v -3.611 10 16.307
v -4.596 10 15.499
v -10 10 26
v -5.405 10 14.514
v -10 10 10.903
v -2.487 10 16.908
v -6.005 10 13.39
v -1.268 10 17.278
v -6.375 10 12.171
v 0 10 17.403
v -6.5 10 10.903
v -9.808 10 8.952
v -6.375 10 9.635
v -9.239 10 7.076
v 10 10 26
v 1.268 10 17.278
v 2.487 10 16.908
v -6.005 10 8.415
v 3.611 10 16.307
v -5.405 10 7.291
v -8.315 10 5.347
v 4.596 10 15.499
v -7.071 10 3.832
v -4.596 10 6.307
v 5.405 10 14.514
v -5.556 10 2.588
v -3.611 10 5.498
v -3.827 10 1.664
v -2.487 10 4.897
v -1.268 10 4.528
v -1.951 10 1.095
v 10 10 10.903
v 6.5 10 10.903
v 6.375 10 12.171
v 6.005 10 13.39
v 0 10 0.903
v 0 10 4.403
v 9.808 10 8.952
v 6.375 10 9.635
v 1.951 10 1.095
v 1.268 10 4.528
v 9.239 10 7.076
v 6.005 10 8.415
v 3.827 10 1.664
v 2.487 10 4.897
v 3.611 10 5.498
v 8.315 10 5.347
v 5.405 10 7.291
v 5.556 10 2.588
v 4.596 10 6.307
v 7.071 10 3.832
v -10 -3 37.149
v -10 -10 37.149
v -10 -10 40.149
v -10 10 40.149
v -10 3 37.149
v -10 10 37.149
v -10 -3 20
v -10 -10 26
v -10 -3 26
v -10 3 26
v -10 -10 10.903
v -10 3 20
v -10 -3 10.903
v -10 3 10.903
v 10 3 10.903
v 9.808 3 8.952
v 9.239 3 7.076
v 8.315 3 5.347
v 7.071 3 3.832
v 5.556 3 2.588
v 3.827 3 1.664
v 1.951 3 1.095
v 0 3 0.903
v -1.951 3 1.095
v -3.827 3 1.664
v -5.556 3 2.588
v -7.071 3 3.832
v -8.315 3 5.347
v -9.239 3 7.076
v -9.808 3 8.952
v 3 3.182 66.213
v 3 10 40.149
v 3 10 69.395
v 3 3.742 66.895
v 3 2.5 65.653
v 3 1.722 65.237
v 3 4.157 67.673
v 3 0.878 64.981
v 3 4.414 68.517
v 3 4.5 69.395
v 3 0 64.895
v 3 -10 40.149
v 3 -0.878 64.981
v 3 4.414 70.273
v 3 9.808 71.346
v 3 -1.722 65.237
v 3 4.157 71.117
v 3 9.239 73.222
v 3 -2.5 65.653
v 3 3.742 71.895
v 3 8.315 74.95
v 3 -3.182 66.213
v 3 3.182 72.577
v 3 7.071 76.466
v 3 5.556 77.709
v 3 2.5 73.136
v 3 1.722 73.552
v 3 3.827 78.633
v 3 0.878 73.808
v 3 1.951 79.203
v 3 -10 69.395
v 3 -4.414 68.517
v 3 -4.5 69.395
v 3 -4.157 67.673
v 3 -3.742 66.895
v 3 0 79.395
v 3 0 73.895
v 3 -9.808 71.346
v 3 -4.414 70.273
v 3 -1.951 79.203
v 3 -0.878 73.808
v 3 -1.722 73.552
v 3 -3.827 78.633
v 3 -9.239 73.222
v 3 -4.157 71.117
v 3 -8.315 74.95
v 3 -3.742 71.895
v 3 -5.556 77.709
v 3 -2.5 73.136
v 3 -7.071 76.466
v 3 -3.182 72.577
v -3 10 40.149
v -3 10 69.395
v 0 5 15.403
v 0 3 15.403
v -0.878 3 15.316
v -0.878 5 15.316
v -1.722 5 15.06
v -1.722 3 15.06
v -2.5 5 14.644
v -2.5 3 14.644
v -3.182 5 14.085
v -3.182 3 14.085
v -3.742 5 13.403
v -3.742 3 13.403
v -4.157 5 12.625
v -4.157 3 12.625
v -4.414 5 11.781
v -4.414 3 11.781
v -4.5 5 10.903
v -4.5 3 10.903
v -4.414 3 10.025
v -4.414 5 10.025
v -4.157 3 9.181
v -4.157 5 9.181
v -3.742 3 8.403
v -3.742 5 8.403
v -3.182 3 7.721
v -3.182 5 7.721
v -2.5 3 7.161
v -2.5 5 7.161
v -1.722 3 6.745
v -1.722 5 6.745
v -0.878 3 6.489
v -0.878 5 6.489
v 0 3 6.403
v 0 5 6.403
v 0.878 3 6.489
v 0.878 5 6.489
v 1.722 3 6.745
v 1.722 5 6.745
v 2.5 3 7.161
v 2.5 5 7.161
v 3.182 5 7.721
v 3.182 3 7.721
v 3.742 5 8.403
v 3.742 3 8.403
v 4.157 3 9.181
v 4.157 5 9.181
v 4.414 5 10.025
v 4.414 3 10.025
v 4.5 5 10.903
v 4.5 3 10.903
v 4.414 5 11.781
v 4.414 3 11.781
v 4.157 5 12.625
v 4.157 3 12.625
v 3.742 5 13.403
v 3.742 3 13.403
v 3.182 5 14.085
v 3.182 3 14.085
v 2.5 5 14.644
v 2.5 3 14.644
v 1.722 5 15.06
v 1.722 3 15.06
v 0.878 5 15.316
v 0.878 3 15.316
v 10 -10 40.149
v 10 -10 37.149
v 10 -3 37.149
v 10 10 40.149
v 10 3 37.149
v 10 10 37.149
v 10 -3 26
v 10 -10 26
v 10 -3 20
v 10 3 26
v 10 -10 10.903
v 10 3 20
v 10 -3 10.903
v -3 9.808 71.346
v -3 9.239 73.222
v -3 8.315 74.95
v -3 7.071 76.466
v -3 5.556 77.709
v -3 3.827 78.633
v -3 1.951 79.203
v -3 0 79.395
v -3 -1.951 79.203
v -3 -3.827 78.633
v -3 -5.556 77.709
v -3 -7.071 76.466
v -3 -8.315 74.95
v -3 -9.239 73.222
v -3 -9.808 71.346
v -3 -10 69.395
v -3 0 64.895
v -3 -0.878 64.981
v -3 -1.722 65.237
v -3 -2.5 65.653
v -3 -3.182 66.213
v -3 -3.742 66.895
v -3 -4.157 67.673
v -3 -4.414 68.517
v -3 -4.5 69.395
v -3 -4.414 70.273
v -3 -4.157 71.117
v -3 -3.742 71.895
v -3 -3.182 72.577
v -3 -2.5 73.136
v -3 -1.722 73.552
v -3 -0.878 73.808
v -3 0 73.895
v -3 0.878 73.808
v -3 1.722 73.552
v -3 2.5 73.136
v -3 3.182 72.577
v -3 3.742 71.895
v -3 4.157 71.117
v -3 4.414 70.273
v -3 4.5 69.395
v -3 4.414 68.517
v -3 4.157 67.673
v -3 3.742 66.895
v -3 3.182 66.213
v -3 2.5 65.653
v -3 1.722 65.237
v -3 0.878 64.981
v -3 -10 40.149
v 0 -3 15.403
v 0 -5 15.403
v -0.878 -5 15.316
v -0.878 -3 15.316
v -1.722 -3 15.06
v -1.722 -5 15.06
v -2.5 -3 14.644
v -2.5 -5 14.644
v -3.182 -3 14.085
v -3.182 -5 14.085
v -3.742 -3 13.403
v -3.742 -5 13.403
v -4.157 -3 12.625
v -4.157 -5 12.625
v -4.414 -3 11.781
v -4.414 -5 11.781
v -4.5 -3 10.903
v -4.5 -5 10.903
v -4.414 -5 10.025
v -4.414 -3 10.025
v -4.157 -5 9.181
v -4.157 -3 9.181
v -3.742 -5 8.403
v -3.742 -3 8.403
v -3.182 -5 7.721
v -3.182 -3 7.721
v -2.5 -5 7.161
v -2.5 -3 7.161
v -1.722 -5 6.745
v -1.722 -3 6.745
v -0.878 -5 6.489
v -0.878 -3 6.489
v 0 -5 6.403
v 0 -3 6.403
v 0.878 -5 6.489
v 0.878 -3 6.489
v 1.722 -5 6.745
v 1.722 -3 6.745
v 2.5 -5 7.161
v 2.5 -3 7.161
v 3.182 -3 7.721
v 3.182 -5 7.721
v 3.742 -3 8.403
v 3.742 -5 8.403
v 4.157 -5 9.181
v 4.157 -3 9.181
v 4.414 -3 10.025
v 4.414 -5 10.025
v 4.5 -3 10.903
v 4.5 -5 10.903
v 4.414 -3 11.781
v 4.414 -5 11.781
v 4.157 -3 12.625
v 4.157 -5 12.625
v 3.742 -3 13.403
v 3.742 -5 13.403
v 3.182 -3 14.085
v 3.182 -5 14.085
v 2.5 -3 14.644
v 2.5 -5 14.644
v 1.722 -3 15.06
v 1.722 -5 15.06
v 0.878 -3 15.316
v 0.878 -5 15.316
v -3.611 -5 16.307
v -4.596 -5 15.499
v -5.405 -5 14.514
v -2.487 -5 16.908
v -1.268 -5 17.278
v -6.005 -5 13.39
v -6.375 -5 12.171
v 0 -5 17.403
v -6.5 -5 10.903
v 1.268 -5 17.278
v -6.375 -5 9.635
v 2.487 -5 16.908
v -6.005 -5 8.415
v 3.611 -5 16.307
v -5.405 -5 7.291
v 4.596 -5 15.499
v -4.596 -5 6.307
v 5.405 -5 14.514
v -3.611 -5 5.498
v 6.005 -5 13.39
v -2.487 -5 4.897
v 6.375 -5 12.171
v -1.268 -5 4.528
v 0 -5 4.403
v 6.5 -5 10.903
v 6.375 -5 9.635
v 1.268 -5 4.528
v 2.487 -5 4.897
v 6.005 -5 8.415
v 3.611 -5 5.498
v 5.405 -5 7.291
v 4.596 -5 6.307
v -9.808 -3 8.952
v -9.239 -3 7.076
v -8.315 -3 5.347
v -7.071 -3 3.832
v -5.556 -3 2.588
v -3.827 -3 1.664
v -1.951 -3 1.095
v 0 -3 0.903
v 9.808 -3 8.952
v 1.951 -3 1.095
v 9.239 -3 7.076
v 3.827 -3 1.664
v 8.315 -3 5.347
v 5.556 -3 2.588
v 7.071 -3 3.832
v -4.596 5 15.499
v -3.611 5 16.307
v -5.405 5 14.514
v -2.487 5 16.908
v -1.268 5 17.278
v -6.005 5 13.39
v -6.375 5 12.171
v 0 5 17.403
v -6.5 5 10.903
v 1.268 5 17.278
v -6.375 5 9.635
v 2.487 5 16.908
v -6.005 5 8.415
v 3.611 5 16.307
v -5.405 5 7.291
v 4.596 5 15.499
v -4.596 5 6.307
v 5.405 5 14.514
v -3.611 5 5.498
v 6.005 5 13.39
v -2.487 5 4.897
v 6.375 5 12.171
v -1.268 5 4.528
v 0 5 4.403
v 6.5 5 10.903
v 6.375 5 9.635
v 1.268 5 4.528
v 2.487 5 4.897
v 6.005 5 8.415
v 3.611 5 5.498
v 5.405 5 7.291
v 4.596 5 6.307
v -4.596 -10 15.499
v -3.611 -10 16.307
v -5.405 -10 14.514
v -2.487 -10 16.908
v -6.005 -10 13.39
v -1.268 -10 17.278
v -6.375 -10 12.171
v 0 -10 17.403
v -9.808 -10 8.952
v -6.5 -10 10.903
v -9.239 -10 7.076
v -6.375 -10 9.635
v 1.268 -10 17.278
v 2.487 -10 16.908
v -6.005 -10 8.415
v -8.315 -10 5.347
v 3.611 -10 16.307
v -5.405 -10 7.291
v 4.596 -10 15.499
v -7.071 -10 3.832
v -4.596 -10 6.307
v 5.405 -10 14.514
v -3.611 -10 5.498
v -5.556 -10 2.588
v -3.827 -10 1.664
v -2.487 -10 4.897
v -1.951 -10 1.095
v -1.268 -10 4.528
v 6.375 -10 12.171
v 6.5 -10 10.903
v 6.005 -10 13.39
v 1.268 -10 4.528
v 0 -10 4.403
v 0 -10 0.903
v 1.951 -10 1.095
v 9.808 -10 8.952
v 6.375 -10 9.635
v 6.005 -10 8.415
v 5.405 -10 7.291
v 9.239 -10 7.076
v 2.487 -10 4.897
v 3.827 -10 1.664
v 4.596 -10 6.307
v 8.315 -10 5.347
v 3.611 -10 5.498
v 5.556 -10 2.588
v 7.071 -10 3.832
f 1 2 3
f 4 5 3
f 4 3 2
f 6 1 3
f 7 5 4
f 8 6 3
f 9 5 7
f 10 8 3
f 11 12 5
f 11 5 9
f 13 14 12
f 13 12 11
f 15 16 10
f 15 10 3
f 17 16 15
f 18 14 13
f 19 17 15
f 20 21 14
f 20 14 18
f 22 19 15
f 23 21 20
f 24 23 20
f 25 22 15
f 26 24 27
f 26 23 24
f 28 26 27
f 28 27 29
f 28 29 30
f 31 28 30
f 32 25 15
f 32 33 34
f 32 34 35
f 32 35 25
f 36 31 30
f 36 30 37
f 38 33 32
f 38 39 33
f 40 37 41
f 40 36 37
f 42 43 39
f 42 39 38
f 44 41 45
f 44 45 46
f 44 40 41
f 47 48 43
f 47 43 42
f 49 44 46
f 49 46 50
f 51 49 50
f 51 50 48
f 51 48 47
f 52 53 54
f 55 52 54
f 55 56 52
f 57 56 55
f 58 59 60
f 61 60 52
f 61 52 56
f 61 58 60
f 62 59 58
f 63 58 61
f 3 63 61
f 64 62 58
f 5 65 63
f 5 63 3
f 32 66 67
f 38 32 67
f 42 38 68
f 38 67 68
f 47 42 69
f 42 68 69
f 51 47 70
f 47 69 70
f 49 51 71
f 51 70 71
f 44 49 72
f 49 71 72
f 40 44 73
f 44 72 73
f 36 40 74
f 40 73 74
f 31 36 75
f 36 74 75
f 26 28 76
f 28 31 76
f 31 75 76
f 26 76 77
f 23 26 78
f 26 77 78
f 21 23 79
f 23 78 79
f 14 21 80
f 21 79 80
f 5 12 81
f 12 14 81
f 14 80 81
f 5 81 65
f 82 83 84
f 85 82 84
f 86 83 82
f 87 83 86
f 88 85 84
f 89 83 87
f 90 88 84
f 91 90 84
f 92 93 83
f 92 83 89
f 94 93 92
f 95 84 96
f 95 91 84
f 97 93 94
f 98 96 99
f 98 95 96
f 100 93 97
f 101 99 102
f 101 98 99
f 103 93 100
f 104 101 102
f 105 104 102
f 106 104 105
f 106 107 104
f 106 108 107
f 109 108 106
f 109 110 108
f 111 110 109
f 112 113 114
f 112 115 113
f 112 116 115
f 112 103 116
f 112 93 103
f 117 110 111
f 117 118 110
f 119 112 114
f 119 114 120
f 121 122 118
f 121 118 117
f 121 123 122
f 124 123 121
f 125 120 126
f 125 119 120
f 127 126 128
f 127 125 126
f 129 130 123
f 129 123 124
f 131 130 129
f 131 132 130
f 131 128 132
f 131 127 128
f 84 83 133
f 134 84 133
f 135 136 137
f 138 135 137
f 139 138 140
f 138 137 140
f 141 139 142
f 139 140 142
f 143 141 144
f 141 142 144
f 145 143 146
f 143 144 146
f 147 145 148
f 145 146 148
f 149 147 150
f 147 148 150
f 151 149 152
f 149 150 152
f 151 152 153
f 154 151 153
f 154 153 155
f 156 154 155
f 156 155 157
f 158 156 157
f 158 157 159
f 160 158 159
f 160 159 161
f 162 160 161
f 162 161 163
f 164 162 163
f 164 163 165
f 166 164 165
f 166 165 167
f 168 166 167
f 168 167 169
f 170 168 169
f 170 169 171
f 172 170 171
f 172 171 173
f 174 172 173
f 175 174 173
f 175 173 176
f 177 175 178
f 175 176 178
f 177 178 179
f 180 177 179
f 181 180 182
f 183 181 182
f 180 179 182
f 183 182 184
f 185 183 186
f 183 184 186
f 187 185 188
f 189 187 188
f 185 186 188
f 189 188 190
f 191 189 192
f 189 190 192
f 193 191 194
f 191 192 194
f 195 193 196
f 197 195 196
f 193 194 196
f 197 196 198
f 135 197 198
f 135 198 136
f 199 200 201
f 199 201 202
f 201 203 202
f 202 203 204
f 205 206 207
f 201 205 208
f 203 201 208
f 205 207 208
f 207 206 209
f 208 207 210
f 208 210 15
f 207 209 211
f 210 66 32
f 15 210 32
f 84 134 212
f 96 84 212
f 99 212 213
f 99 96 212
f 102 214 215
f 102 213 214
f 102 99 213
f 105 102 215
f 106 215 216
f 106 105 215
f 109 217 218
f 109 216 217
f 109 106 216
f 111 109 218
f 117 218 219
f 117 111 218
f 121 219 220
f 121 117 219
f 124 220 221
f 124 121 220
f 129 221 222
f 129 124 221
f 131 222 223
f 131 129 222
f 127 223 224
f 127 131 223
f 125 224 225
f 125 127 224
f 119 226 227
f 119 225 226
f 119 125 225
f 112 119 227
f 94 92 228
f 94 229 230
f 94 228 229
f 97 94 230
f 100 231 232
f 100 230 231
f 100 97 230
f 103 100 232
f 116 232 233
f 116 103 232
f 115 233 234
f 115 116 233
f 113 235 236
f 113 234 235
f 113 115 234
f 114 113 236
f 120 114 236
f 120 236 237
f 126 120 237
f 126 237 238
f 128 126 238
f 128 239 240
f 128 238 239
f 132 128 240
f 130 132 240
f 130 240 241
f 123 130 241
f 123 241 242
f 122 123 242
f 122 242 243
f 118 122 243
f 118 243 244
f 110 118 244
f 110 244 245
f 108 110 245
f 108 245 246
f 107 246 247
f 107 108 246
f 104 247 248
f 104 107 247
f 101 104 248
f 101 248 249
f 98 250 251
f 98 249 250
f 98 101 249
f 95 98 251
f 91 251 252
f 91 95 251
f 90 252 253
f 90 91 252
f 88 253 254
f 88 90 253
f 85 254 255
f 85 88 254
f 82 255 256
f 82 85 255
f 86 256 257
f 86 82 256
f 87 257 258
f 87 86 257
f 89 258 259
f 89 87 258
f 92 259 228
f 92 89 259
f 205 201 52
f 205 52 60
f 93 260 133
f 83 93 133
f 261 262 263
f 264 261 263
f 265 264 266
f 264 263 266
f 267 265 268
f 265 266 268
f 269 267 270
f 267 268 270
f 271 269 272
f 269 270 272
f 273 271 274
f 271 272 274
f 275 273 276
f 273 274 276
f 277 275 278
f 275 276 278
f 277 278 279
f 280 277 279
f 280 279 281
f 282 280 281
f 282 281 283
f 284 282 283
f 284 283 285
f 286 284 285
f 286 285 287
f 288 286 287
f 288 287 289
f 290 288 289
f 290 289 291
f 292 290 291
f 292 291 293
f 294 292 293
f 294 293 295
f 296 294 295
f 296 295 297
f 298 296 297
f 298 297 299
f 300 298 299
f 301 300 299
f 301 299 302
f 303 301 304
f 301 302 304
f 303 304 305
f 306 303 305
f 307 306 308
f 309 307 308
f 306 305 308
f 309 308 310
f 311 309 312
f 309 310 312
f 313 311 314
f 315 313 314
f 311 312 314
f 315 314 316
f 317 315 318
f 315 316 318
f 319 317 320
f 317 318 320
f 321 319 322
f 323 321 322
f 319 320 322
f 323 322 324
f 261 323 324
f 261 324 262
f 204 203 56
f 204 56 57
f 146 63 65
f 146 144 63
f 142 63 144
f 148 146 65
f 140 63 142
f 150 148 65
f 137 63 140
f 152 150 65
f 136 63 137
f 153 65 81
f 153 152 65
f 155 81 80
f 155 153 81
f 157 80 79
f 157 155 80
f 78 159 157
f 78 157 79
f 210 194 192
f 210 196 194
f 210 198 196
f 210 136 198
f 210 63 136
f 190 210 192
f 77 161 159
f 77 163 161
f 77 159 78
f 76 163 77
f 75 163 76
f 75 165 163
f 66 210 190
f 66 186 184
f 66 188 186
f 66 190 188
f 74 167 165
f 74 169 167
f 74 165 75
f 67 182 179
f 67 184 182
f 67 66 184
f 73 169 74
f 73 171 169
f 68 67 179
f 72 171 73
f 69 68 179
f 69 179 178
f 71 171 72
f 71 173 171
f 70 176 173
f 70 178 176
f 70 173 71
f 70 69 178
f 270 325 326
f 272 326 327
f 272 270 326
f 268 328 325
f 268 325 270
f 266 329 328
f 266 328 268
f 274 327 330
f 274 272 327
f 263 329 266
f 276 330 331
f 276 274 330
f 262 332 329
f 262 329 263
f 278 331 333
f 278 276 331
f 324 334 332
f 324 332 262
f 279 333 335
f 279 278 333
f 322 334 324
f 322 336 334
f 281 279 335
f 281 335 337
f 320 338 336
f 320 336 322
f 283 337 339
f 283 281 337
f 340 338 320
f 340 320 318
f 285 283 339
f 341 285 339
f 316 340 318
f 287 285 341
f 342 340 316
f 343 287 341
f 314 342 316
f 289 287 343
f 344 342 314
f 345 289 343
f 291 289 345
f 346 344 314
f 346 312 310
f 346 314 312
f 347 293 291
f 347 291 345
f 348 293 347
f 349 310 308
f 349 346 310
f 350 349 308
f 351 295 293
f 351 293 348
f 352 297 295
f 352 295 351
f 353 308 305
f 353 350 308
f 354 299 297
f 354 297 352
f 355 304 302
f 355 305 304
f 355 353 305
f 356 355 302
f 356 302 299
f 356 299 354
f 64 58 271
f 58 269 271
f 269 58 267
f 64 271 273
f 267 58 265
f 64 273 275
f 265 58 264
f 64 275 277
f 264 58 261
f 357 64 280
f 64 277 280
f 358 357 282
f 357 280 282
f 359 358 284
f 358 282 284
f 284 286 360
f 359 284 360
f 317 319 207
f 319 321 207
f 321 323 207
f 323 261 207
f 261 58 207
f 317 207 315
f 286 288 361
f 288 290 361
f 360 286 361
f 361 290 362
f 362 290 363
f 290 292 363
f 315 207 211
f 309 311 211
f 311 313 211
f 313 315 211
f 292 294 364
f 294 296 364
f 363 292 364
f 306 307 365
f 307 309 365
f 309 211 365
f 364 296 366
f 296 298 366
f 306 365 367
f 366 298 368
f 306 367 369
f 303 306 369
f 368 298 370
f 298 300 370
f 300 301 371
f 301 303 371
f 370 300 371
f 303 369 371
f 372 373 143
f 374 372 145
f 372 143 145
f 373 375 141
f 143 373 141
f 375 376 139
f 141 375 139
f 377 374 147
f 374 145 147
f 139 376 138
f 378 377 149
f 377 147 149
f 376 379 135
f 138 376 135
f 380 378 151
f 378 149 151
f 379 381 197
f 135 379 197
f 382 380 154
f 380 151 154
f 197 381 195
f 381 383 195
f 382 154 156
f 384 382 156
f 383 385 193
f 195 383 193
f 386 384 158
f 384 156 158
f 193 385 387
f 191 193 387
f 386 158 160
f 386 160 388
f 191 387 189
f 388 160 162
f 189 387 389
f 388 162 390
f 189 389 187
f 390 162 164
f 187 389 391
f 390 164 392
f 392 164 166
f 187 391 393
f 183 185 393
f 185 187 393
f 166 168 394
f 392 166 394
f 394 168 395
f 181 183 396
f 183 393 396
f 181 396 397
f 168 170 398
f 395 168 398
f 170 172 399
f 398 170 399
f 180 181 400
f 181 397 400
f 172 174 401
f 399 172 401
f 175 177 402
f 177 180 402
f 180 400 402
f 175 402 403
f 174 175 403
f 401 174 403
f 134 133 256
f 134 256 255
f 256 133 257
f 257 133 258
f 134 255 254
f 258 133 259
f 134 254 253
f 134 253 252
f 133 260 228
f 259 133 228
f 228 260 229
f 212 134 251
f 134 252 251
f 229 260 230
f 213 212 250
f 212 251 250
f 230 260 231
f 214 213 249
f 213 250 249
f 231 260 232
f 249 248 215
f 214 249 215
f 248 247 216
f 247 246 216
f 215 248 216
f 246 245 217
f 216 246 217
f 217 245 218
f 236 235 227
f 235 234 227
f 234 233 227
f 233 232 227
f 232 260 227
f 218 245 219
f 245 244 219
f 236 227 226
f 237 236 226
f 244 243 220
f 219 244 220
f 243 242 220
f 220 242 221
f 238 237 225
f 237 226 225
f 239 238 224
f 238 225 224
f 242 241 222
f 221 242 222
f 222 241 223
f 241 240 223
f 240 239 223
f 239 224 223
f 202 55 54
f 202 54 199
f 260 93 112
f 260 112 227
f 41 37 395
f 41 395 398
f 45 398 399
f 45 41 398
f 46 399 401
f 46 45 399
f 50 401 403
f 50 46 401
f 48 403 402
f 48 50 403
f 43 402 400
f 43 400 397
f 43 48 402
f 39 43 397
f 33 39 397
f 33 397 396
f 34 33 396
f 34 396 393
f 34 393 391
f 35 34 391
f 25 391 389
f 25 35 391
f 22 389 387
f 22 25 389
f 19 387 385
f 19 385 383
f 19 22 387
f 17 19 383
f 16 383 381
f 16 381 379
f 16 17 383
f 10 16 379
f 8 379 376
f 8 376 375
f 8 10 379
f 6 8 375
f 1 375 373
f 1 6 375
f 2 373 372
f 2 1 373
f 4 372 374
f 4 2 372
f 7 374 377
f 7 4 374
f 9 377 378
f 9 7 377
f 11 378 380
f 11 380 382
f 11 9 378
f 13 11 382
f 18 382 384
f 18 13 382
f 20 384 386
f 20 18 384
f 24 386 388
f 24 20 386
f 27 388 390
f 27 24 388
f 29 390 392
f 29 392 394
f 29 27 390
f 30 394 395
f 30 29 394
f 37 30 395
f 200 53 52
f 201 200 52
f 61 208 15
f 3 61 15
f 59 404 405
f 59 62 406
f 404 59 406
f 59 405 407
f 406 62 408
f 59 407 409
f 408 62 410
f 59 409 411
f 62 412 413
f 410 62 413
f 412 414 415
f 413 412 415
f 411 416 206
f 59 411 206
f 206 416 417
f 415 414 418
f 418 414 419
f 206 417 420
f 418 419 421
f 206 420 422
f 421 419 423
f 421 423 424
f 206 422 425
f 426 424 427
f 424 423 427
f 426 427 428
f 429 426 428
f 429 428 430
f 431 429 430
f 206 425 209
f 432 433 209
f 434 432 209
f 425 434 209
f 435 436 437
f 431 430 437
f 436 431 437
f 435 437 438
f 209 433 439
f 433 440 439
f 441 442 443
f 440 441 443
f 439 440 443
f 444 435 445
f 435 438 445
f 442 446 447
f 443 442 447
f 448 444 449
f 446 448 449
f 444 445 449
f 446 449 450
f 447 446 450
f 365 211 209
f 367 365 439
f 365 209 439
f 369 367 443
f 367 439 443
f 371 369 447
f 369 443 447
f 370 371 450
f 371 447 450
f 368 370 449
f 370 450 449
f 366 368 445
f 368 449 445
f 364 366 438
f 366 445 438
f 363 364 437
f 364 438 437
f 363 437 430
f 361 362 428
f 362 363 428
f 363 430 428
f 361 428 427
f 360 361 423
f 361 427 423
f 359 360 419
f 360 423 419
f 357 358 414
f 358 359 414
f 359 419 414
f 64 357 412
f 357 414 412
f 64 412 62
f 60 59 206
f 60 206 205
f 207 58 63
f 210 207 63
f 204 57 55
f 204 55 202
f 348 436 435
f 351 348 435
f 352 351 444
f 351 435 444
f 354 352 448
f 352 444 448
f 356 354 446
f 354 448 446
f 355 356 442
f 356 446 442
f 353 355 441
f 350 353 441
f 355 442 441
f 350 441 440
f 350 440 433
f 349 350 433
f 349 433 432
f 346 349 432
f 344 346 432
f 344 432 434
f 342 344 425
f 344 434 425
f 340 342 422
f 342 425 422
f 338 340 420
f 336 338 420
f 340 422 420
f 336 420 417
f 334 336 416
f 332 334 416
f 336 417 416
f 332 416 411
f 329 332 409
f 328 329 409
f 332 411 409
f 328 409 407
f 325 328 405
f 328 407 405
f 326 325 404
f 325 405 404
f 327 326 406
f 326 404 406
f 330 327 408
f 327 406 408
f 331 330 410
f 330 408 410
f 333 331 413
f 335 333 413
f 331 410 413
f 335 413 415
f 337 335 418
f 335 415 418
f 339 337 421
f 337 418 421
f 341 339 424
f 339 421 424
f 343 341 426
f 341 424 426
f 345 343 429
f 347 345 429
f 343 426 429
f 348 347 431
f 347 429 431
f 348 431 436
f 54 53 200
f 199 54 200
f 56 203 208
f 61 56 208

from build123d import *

# Parameters (mm, degrees)
SKETCH_1_W          = 20
SKETCH_1_H          = 20
EXTRUDE_1_DEPTH     = 80.297387422
SKETCH_7_W          = 20
SKETCH_7_H          = 6
SKETCH_7_W_2        = 11.148693711
SKETCH_7_H_2        = 7
CUT_EXTRUDE_6_DEPTH = 34
SKETCH_2_R          = 6.5
CUT_EXTRUDE_1_DEPTH = 5
SKETCH_3_R          = 4.5
CUT_EXTRUDE_2_DEPTH = 29
MOVE_BODY_1_ANGLE   = 90
SKETCH_9_W          = 7
SKETCH_9_H          = 39.245987558
CUT_EXTRUDE_7_DEPTH = 34


# Read off the part's stored shape, not the designer's step: 교차3
with BuildPart() as part:
    # 스케치1 → 보스-돌출1 (new body)
    with BuildSketch(Plane.XY):
        Rectangle(SKETCH_1_W, SKETCH_1_H)
    extrude(amount=EXTRUDE_1_DEPTH)

    # 스케치7 → 컷-돌출6 (cut)
    with BuildSketch(Plane(origin=(10, 0, 0), x_dir=(0, 0, -1), z_dir=(1, 0, 0))):
        with Locations((-10, 0)):
            Rectangle(SKETCH_7_W, SKETCH_7_H)
        with Locations((-31.574346855, 6.5)):
            Rectangle(SKETCH_7_W_2, SKETCH_7_H_2)
        with Locations((-31.574346855, -6.5)):
            Rectangle(SKETCH_7_W_2, SKETCH_7_H_2)
    extrude(amount=-CUT_EXTRUDE_6_DEPTH, mode=Mode.SUBTRACT)

    # 스케치2 → 컷-돌출1 (cut)
    with BuildSketch(Plane(origin=(0, -10, 0), x_dir=(-1, 0, 0), z_dir=(0, -1, 0))):
        with Locations(Location((0, -10.902706153, 0), (0, 0, 90))):
            Circle(SKETCH_2_R)
    cut_extrude_1 = extrude(amount=-CUT_EXTRUDE_1_DEPTH, mode=Mode.SUBTRACT)

    # 대칭 복사7: 컷-돌출1 across plane
    add(cut_extrude_1.mirror(Plane.ZX), mode=Mode.SUBTRACT)

    # 스케치3 → 컷-돌출2 (cut)
    with BuildSketch(Plane(origin=(0, -10, 0), x_dir=(-1, 0, 0), z_dir=(0, -1, 0))):
        with Locations(Location((0, -10.902706153, 0), (0, 0, 270))):
            Circle(SKETCH_3_R)
        with BuildLine():
            Line((-21.262122506, -10.902706153), (-10, -10.902706153))
            ThreePointArc((-10, -10.902706153), (0, -0.902706153), (10, -10.902706153))
            Line((10, -10.902706153), (21.262122506, -10.902706153))
            ThreePointArc((21.262122506, -10.902706153), (0, 10.359416353), (-21.262122506, -10.902706153))
        make_face()
    cut_extrude_2 = extrude(amount=-CUT_EXTRUDE_2_DEPTH, mode=Mode.SUBTRACT)

    # 대칭 복사6: 컷-돌출2 across plane
    add(cut_extrude_2.mirror(Plane.XY.offset(40.148693711)), mode=Mode.SUBTRACT)


with BuildPart() as body_2:
    # 교차3: the piece on the far side of the plane
    add(part.part)
    split(bisect_by=Plane.XY.offset(40.148693711), keep=Keep.BOTTOM)


with BuildPart() as part_1:
    add(part.part)

    # 교차3
    split(bisect_by=Plane.XY.offset(40.148693711), keep=Keep.TOP)


with BuildPart() as part_2:
    # Move Body 1: moved
    add(part_1.part.rotate(Axis((0, 0, 0), (0, 0, 1)), MOVE_BODY_1_ANGLE))

    # 스케치9 → 컷-돌출7 (cut)
    with BuildSketch(Plane.XZ.offset(10)):
        with Locations((6.5, 59.77168749)):
            Rectangle(SKETCH_9_W, SKETCH_9_H)
        with Locations((-6.5, 59.77168749)):
            Rectangle(SKETCH_9_W, SKETCH_9_H)
    extrude(amount=-CUT_EXTRUDE_7_DEPTH, mode=Mode.SUBTRACT)


solid = Compound([body_2.part, part_2.part])
